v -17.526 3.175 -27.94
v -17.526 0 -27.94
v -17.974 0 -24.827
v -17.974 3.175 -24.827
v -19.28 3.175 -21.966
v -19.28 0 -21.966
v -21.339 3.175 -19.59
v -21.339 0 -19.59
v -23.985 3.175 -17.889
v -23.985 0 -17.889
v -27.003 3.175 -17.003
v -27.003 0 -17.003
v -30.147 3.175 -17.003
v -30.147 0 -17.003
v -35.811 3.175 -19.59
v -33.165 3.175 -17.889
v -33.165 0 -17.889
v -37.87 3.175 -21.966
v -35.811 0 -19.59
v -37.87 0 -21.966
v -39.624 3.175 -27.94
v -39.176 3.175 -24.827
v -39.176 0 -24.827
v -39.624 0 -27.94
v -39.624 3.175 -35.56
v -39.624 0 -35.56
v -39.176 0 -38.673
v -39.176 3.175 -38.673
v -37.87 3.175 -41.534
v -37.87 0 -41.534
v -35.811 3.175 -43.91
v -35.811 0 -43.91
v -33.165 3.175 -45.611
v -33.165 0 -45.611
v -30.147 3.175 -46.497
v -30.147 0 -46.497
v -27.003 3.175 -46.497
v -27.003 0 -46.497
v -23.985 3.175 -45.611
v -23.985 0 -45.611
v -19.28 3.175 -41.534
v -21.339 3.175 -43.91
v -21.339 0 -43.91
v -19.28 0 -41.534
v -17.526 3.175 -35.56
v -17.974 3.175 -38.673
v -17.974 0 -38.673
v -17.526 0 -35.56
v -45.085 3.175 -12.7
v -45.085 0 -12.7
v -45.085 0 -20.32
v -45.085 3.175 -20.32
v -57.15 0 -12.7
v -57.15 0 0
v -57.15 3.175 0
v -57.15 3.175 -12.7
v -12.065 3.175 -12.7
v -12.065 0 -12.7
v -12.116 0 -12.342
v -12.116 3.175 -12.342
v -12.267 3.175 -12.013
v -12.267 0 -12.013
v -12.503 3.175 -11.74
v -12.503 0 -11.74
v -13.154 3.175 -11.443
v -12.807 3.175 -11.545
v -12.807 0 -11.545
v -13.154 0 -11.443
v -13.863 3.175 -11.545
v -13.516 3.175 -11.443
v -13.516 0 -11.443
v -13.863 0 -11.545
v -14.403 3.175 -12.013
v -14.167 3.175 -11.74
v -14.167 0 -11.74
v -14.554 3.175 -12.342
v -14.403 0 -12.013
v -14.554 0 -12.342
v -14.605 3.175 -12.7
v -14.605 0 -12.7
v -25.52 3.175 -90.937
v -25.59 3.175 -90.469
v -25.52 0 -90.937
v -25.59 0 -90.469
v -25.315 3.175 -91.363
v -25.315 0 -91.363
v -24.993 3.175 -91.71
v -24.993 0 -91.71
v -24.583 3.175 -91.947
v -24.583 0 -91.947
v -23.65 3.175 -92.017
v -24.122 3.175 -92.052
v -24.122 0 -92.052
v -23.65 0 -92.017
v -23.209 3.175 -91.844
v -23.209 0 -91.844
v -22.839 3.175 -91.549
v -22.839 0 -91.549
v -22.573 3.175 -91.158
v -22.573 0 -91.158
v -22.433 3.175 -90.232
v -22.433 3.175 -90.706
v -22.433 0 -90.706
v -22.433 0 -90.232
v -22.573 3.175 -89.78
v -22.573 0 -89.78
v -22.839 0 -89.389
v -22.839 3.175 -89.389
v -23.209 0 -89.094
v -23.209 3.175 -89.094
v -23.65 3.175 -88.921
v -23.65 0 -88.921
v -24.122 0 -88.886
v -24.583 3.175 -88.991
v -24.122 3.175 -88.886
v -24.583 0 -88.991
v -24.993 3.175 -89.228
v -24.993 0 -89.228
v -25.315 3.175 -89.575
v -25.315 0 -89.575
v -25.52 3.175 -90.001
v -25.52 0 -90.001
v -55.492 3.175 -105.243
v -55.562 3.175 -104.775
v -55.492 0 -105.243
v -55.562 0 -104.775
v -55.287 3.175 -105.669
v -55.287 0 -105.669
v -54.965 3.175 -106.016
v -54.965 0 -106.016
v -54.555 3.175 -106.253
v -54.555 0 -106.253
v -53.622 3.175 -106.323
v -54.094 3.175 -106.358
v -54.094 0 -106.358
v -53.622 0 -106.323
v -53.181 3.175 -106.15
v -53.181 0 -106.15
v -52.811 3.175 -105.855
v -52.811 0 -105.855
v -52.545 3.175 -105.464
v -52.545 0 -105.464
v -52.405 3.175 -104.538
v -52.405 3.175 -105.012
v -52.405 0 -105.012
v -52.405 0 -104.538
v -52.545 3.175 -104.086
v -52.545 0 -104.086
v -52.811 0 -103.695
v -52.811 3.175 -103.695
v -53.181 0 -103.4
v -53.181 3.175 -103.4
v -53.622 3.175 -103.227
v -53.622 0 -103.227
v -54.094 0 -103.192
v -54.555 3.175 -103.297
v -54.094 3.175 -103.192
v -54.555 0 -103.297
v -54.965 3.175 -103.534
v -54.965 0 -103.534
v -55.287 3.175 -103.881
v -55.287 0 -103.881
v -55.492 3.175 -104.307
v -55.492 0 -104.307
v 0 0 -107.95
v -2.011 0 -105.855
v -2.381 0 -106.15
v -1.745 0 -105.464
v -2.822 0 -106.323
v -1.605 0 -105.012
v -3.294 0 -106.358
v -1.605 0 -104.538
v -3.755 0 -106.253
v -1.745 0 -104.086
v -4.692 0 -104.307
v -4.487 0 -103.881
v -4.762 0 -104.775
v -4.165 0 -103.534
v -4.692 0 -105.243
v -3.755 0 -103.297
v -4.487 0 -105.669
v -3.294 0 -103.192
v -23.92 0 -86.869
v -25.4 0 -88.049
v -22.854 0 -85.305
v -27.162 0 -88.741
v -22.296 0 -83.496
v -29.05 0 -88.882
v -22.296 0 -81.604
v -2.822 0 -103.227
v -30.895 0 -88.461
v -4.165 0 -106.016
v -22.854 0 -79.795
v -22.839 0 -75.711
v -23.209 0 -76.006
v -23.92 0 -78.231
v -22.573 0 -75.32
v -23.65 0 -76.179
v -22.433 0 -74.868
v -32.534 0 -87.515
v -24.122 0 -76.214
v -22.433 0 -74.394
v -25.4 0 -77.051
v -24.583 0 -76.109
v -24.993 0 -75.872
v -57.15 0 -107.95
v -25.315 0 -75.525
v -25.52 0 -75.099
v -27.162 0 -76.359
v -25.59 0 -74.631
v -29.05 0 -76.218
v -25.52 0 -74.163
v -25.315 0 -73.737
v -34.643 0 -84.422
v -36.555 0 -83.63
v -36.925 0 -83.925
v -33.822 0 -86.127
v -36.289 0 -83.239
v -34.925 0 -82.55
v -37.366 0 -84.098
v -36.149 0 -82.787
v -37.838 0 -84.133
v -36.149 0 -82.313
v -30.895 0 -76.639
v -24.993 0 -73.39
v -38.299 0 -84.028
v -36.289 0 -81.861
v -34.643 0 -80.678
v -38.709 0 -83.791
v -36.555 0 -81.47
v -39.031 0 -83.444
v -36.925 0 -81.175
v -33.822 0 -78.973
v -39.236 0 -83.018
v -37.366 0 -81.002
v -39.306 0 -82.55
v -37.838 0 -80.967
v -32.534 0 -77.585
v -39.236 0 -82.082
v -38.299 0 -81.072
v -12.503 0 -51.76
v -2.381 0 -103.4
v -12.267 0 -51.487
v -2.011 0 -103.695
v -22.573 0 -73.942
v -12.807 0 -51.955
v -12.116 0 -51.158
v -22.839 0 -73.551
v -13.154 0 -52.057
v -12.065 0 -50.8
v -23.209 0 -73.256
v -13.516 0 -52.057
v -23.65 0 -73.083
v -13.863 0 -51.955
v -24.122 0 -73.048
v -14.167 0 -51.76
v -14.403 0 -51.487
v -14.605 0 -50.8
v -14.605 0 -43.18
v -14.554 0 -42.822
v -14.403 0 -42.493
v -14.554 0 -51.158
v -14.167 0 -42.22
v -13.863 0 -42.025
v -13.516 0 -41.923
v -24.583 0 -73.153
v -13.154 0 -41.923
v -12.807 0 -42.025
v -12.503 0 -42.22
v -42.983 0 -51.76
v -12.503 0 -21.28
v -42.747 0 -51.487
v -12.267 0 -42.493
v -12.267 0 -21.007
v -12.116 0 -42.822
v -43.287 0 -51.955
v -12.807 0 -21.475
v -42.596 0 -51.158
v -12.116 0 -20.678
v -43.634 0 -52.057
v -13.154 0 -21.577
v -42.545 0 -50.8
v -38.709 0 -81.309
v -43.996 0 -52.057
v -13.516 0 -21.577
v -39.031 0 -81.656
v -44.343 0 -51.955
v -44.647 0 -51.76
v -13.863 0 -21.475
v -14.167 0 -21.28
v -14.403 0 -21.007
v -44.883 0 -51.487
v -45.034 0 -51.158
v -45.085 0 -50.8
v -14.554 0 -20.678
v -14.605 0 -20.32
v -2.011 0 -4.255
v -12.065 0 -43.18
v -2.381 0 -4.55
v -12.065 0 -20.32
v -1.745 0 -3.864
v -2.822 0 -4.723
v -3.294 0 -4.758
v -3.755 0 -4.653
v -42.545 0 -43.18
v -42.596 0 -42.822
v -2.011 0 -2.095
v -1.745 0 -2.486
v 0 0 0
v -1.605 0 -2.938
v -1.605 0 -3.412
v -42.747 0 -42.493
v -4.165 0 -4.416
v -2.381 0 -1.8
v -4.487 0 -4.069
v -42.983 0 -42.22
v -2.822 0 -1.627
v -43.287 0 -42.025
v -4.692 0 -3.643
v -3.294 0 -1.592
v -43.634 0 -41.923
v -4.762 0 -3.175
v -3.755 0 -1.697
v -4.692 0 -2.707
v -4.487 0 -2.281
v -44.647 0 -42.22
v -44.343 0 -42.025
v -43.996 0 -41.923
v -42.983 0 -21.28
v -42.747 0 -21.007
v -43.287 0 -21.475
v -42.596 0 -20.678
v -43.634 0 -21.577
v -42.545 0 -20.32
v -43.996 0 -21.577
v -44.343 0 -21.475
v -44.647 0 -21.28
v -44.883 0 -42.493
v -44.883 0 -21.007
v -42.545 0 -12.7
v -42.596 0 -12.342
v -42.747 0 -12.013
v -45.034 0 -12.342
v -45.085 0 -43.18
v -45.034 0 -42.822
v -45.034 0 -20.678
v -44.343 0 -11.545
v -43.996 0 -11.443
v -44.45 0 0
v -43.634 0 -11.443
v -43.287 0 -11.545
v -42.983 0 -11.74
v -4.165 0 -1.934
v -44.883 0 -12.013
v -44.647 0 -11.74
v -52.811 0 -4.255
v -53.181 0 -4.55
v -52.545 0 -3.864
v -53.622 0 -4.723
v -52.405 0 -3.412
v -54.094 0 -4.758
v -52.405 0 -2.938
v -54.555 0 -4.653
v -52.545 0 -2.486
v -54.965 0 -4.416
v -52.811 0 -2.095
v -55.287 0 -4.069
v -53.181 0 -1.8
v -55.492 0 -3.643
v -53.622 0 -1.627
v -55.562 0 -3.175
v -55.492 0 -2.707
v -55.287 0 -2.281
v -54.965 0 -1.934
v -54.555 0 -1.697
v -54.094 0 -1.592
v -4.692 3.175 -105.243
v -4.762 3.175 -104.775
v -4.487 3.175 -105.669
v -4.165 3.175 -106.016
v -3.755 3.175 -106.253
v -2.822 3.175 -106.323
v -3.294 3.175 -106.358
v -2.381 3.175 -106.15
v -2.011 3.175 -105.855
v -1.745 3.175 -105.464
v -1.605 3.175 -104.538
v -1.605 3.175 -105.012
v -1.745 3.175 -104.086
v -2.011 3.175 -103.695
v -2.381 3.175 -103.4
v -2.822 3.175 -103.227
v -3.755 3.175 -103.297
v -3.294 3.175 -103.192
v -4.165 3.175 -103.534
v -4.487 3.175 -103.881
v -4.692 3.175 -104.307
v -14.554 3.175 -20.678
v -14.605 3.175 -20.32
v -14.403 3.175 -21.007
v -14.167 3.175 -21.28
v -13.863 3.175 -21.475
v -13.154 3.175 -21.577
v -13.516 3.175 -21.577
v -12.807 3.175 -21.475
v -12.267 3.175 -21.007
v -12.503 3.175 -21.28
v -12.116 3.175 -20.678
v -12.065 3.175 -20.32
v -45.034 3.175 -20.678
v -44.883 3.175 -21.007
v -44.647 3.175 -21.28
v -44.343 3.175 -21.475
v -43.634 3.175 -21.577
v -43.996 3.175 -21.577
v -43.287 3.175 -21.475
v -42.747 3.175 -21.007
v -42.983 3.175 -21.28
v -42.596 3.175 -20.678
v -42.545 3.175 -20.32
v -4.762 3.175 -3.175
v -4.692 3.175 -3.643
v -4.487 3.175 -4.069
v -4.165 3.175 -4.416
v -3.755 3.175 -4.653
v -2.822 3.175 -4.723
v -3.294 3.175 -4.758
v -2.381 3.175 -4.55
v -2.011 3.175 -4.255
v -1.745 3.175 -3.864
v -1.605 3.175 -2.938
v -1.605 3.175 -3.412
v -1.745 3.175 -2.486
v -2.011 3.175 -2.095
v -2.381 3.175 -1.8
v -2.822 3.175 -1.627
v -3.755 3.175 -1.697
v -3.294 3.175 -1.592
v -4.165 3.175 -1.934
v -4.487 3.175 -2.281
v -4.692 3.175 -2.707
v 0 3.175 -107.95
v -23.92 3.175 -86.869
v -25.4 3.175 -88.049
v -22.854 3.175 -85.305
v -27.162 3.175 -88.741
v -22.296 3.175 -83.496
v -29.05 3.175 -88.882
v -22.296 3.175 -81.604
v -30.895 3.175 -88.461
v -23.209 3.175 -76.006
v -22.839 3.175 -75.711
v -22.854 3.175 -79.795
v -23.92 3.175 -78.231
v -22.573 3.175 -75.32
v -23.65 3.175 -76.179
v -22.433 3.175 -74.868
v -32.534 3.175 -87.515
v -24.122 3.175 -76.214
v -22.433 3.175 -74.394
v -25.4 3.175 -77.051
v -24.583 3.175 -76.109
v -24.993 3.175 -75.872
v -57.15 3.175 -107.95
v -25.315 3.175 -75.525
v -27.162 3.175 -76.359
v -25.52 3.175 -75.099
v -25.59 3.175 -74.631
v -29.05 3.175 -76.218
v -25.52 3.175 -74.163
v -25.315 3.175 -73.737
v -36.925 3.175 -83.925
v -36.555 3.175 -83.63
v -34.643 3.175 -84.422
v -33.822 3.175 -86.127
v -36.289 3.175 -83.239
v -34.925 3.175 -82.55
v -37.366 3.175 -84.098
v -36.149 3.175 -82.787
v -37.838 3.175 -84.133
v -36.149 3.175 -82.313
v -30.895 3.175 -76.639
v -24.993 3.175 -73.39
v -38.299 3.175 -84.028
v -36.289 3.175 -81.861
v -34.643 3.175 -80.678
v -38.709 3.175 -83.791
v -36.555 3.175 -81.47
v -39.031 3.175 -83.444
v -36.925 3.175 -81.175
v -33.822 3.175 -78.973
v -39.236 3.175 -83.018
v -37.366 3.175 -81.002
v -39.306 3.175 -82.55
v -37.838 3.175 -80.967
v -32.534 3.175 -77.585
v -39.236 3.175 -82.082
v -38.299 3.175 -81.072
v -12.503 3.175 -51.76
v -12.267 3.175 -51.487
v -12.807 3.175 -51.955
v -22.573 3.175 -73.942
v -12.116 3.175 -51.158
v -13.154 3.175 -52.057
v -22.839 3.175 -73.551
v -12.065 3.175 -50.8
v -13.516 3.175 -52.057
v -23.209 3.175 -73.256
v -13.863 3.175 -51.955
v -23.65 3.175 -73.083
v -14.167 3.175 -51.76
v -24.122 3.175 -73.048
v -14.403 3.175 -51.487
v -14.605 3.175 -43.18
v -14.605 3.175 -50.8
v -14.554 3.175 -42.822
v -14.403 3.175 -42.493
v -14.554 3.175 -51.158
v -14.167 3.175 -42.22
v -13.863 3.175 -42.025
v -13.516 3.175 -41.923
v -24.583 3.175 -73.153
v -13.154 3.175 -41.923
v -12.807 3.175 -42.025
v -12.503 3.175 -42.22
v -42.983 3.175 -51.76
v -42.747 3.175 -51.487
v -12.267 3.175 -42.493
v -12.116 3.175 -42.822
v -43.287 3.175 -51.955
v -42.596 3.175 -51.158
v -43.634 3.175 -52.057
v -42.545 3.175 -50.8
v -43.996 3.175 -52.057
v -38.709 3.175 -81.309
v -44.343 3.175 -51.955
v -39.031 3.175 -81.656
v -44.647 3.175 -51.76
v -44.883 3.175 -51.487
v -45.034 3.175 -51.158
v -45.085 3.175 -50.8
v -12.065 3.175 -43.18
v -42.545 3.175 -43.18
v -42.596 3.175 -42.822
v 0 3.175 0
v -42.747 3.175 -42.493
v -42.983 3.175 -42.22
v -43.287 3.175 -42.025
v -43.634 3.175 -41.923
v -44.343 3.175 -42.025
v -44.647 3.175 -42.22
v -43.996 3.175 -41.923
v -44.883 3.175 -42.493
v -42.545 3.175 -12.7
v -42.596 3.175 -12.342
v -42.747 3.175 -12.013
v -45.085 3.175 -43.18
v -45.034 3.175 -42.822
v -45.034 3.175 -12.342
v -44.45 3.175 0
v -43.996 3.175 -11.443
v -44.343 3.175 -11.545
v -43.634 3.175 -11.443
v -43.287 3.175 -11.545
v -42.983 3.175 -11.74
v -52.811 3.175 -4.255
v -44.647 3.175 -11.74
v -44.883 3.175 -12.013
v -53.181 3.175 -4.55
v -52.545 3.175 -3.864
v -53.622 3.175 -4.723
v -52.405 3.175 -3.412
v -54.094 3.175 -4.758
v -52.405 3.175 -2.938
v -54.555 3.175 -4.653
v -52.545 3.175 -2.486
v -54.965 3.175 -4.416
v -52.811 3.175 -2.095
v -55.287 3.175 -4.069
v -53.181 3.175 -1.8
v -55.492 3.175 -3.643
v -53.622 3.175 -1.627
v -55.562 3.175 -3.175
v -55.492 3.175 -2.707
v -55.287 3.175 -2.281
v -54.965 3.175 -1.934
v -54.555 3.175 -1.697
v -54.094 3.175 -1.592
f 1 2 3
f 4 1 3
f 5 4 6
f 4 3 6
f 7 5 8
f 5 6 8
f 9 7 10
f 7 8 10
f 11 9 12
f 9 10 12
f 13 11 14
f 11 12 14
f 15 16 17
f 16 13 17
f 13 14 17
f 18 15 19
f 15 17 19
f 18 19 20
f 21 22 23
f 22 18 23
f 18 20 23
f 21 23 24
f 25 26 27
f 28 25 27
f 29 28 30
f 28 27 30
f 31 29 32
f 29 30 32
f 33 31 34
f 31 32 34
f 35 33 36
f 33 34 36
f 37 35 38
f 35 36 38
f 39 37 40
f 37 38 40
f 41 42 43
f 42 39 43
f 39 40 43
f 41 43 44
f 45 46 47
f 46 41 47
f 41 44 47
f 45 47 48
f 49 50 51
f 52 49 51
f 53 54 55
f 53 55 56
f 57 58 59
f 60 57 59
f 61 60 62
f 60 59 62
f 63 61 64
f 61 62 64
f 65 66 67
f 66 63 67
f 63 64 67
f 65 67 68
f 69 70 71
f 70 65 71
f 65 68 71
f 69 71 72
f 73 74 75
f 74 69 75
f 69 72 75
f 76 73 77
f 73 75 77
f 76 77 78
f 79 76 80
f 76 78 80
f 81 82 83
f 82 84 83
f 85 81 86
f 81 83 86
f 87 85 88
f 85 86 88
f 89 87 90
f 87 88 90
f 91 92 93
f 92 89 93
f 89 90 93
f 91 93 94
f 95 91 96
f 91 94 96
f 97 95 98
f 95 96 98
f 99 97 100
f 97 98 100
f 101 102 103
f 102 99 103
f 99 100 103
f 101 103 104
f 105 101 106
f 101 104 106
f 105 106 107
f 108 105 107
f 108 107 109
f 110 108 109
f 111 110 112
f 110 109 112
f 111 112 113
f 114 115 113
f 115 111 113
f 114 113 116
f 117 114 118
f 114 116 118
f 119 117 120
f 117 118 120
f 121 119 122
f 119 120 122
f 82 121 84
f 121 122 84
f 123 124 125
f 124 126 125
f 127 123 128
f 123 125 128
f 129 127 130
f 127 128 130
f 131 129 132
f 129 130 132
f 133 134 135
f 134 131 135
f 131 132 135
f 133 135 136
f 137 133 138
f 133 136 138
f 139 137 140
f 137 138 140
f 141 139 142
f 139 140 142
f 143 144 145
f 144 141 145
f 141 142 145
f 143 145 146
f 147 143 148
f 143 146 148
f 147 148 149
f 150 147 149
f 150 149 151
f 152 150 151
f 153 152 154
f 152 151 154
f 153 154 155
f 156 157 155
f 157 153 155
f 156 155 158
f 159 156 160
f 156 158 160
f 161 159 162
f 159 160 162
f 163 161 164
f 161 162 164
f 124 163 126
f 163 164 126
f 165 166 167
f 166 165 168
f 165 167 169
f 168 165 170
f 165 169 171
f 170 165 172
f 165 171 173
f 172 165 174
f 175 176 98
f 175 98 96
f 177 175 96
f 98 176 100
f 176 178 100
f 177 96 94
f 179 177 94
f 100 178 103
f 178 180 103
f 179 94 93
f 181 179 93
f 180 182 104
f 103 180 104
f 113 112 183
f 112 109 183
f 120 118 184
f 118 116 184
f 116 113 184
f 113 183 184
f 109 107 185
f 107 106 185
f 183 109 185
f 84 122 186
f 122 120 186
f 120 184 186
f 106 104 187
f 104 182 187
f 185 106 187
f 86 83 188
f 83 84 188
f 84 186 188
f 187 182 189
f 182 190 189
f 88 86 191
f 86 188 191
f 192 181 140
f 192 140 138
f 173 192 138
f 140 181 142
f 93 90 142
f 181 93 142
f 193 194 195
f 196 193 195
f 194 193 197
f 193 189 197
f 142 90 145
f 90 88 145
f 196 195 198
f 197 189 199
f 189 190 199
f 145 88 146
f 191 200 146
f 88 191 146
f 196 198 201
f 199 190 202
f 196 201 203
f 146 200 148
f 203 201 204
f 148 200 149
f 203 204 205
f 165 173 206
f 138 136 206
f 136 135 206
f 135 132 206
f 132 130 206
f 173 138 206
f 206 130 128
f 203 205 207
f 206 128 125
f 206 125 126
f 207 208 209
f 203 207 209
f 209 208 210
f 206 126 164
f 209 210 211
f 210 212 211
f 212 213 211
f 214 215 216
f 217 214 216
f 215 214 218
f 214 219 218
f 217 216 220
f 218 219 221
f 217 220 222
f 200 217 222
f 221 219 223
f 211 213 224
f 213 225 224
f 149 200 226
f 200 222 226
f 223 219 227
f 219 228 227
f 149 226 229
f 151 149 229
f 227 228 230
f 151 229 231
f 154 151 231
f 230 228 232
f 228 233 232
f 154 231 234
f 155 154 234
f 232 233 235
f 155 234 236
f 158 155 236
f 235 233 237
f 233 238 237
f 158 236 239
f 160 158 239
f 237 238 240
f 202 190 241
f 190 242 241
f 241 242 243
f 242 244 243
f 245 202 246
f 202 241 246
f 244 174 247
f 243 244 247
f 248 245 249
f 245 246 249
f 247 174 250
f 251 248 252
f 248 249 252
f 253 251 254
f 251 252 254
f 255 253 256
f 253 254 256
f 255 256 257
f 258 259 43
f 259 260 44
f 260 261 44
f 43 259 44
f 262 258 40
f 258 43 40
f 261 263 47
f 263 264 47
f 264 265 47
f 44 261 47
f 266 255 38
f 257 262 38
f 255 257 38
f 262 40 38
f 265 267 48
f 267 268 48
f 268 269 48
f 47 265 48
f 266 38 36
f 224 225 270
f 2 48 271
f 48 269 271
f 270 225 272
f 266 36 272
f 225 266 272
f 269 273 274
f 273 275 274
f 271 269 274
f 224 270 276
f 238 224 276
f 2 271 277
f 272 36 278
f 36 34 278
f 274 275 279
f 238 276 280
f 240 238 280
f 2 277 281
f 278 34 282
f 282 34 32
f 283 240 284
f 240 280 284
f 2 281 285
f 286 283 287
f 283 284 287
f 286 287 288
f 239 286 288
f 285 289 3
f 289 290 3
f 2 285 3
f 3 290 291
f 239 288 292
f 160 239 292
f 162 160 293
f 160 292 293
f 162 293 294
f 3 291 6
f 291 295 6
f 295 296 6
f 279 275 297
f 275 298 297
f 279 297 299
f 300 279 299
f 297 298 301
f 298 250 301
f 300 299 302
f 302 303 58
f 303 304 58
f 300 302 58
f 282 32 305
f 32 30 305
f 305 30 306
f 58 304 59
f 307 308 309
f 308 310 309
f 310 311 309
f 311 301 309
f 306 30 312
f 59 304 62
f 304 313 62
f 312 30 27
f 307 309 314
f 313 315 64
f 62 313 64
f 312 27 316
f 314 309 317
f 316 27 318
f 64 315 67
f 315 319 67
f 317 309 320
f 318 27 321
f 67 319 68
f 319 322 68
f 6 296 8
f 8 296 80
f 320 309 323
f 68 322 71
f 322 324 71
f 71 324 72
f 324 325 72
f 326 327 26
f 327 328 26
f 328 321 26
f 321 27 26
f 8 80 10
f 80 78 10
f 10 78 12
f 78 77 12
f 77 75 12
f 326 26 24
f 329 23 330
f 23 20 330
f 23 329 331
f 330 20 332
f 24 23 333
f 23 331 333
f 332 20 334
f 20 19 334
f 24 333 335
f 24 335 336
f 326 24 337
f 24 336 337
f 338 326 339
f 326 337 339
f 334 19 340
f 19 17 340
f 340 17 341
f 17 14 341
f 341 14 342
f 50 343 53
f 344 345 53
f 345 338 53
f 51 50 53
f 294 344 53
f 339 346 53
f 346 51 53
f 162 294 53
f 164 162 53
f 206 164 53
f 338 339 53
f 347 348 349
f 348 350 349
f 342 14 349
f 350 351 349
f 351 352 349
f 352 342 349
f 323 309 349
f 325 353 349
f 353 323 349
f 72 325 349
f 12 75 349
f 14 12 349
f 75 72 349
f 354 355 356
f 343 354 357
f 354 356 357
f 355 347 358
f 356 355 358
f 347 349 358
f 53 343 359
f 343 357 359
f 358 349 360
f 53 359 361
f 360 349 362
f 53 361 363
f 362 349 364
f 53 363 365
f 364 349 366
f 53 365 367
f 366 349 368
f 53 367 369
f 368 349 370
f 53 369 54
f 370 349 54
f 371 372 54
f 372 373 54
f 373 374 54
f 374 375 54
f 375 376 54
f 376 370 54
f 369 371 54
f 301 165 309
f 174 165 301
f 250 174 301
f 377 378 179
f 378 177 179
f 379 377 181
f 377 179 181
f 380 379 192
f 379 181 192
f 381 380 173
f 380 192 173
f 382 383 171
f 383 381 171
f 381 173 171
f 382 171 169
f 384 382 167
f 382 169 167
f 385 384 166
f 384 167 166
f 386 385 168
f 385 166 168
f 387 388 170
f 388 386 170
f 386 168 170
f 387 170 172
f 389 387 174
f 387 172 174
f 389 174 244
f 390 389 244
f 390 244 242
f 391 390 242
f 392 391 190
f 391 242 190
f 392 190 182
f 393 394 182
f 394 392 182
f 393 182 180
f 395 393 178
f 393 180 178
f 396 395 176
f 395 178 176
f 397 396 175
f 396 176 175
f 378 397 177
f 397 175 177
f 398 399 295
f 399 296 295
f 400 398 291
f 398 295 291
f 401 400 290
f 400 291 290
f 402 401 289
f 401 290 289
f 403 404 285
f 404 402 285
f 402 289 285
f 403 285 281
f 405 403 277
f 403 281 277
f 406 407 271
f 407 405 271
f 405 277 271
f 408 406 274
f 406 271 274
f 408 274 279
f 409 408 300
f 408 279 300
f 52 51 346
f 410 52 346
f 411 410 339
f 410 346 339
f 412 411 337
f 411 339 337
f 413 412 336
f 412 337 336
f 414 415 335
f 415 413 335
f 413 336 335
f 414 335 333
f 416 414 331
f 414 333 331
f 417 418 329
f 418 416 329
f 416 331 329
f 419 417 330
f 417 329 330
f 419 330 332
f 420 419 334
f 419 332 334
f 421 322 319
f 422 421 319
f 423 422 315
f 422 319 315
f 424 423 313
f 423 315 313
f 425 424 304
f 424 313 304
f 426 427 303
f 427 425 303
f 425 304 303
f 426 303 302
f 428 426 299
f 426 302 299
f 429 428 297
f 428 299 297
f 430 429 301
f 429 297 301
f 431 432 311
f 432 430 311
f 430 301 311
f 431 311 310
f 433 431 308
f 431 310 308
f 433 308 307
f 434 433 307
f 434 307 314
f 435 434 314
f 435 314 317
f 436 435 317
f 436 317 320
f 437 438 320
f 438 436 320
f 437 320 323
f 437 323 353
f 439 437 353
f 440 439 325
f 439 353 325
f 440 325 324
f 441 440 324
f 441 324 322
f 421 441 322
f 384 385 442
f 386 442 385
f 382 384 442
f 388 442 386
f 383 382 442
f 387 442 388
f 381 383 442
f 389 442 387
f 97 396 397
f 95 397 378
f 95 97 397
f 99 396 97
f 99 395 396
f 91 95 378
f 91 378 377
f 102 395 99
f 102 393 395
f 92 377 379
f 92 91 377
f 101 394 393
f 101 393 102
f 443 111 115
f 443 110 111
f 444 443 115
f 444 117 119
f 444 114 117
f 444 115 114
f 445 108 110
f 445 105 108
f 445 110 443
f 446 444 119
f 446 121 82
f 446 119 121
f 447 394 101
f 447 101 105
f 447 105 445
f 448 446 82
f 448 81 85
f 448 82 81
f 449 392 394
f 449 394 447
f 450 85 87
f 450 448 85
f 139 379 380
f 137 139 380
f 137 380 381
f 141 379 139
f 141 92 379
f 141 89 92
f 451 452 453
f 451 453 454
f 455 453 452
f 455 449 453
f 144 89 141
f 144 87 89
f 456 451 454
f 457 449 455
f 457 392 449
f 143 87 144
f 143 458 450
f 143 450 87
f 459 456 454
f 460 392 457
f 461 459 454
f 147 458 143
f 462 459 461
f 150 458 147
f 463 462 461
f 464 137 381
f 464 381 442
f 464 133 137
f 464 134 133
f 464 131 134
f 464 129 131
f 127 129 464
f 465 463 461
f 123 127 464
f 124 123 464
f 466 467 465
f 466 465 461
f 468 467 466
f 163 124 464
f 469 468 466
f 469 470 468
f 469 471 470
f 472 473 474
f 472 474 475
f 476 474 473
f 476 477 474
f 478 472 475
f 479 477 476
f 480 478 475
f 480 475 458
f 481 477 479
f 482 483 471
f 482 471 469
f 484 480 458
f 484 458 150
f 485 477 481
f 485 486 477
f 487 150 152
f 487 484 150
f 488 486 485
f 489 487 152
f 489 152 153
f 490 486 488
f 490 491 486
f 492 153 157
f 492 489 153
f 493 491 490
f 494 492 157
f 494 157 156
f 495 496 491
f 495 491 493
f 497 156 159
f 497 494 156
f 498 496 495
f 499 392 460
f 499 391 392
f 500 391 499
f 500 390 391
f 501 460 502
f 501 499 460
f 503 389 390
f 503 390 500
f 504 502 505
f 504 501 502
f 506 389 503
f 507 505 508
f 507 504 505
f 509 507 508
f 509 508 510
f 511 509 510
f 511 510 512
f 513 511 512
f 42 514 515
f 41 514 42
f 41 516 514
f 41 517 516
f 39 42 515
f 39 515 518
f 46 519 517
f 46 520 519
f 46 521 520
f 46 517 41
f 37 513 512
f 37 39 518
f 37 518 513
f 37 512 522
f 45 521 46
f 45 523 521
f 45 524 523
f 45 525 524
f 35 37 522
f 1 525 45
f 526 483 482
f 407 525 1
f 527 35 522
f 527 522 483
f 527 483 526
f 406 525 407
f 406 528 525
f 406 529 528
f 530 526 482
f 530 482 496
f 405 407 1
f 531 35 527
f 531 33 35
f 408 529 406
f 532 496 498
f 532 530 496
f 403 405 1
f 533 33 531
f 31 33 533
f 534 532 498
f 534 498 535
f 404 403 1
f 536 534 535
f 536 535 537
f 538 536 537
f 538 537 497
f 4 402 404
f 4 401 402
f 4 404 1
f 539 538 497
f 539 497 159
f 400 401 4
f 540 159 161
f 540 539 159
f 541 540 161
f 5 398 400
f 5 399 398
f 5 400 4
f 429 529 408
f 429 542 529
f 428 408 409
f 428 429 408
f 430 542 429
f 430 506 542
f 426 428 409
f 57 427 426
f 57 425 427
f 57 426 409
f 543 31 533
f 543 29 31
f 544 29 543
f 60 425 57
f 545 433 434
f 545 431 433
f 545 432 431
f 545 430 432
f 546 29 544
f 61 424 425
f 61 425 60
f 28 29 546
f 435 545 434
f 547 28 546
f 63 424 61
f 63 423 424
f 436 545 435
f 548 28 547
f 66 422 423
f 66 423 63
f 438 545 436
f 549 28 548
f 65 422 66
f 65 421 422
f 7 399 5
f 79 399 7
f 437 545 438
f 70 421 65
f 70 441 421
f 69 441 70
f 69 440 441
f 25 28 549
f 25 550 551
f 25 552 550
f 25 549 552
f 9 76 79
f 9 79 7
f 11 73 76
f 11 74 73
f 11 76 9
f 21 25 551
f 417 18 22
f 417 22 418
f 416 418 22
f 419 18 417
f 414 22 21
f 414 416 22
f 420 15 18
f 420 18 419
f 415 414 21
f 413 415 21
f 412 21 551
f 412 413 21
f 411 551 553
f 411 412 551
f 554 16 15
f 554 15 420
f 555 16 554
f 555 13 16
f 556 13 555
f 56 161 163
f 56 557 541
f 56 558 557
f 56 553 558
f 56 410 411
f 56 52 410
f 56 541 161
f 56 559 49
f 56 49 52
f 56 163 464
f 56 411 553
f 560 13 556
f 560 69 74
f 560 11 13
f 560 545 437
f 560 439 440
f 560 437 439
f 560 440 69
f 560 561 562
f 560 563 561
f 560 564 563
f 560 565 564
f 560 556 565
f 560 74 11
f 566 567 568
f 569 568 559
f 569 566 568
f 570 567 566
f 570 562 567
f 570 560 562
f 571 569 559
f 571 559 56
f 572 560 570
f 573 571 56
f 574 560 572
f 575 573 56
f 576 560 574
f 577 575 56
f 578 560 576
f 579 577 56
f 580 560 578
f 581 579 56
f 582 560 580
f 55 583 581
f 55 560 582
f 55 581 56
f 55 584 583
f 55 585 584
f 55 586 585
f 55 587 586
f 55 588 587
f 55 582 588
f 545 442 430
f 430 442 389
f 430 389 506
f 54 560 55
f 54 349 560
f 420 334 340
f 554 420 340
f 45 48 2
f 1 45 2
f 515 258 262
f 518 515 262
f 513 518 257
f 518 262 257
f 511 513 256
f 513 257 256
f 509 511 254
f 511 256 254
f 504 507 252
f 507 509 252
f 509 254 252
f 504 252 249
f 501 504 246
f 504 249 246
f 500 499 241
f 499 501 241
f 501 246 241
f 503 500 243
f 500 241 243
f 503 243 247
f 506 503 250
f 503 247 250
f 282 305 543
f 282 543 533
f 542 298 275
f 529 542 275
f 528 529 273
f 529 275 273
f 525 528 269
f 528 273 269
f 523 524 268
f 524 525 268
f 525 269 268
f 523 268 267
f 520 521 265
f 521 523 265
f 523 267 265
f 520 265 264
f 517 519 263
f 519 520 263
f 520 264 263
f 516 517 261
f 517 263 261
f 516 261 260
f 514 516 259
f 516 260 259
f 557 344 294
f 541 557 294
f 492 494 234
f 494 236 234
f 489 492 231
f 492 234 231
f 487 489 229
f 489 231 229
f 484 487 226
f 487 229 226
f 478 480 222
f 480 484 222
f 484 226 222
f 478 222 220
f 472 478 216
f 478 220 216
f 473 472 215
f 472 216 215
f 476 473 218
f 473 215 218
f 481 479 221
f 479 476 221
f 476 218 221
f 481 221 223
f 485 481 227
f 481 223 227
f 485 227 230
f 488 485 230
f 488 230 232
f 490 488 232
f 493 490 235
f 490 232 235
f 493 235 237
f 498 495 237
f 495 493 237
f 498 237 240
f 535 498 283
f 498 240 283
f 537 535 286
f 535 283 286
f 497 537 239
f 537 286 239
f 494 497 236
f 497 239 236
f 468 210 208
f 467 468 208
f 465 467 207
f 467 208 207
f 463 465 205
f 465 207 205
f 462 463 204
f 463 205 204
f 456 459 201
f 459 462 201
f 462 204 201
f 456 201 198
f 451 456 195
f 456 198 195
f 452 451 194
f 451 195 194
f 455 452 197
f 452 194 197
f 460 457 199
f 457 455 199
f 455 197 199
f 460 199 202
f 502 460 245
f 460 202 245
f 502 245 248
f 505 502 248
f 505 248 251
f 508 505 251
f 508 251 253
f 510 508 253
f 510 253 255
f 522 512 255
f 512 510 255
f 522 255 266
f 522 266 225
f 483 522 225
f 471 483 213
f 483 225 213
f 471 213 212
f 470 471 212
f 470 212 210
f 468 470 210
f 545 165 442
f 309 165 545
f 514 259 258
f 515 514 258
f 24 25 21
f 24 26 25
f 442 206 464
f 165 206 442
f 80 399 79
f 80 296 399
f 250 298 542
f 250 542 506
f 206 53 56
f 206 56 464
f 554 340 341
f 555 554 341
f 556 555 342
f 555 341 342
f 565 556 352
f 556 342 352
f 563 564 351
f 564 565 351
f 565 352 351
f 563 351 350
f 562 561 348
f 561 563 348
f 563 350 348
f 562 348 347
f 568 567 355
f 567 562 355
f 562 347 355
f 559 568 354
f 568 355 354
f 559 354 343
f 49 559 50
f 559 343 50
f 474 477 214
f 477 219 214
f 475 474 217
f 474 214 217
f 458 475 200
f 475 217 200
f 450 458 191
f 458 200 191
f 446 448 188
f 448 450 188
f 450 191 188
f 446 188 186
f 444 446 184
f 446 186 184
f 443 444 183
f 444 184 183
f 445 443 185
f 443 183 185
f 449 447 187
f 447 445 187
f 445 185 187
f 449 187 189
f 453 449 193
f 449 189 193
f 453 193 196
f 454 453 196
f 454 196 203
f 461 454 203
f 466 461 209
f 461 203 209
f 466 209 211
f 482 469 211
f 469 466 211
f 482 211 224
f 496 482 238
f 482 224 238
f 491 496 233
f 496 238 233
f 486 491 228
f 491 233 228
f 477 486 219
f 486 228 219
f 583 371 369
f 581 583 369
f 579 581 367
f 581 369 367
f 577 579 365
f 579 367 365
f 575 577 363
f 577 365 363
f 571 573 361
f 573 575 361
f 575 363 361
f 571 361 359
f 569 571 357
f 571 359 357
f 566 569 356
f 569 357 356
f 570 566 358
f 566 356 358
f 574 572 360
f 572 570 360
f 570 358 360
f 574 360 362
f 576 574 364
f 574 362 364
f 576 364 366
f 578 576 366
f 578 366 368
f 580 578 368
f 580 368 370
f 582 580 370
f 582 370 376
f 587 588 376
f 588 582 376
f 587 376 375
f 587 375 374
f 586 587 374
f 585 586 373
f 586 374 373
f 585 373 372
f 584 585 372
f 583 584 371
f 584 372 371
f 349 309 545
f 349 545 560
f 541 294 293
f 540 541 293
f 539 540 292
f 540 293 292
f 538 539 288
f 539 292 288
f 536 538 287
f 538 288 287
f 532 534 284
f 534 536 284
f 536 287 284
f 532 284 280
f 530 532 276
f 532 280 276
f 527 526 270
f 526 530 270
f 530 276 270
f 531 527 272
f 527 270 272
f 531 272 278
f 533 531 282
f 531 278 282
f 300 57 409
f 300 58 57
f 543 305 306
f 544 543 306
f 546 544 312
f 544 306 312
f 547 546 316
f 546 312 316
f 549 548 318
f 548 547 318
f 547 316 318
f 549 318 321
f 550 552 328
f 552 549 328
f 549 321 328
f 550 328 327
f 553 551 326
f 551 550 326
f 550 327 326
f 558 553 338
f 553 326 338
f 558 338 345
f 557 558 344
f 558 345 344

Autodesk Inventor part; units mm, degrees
ref_plane "YZ Plane" through (0, 0, 0) normal (1, 0, 0) x (0, 1, 0)
ref_plane "XZ Plane" through (0, 0, 0) normal (0, 1, 0) x (-1, 0, 0)
ref_plane "XY Plane" through (0, 0, 0) normal (0, 0, 1) x (1, 0, 0)
sketch "Sketch1" plane through (0, 0, 0) normal (0, 1, 0) x (-1, 0, 0)
  line L0 (0, 0) -> (57.15, 0)
  line L1 (57.15, 0) -> (57.15, -107.95)
  line L2 (57.15, -107.95) -> (0, -107.95)
  line L3 (0, -107.95) -> (0, 0)
  line L4 (57.15, -53.975) -> (0, -53.975) construction
  circle A0 centre (28.575, -35.56) radius 11.049
  line L5 (28.575, -35.56) -> (43.815, -35.56) construction
  line L6 (43.815, -35.56) -> (43.815, -50.8) construction
  line L7 (43.815, -50.8) -> (28.575, -50.8) construction
  line L8 (28.575, -50.8) -> (28.575, -35.56) construction
  line L9 (28.575, -35.56) -> (13.335, -35.56) construction
  line L10 (13.335, -35.56) -> (13.335, -20.32) construction
  line L11 (13.335, -20.32) -> (28.575, -20.32) construction
  line L12 (28.575, -20.32) -> (28.575, -35.56) construction
  line L13 (43.815, -50.8) -> (13.335, -50.8) construction
  line L14 (13.335, -50.8) -> (13.335, -20.32) construction
  line L15 (13.335, -20.32) -> (43.815, -20.32) construction
  line L16 (43.815, -20.32) -> (43.815, -50.8) construction
  circle A1 centre (43.815, -50.8) radius 1.27
  circle A2 centre (43.815, -20.32) radius 1.27
  circle A3 centre (13.335, -50.8) radius 1.27
  circle A4 centre (13.335, -20.32) radius 1.27
  line L17 (28.575, -107.95) -> (28.575, -53.975) construction
  line L18 (28.575, -35.56) -> (28.575, -27.94) construction
  circle A5 centre (28.575, -27.94) radius 11.049
  line L19 (43.815, -50.8) -> (43.815, -43.18) construction
  line L20 (13.335, -50.8) -> (13.335, -43.18) construction
  line L21 (13.335, -20.32) -> (13.335, -12.7) construction
  line L22 (43.815, -20.32) -> (43.815, -12.7) construction
  circle A6 centre (43.815, -43.18) radius 1.27
  circle A7 centre (13.335, -43.18) radius 1.27
  circle A8 centre (13.335, -12.7) radius 1.27
  circle A9 centre (43.815, -12.7) radius 1.27
  line L23 (45.085, -43.18) -> (45.085, -50.8)
  line L24 (42.545, -43.18) -> (42.545, -50.8)
  line L25 (14.605, -43.18) -> (14.605, -50.8)
  line L26 (12.065, -43.18) -> (12.065, -50.8)
  line L27 (12.065, -12.7) -> (12.065, -20.32)
  line L28 (14.605, -20.32) -> (14.605, -12.7)
  line L29 (45.085, -12.7) -> (45.085, -20.32)
  line L30 (42.545, -20.32) -> (42.545, -12.7)
  line L31 (28.575, -107.95) -> (28.575, -82.55) construction
  circle A10 centre (28.575, -82.55) radius 6.35
  line L32 (57.15, 0) -> (57.15, -12.7)
  line L33 (57.15, 0) -> (44.45, 0)
  line L34 (44.45, 0) -> (57.15, -12.7) construction
  line L35 (57.15, 0) -> (50.8, -6.35) construction
  line L36 (0, 0) -> (12.7, 0) construction
  line L37 (0, 0) -> (0, -12.7) construction
  line L38 (0, -12.7) -> (12.7, 0) construction
  line L39 (0, 0) -> (6.35, -6.35) construction
  line L40 (57.15, -107.95) -> (57.15, -95.25) construction
  line L41 (57.15, -107.95) -> (44.45, -107.95) construction
  line L42 (44.45, -107.95) -> (57.15, -95.25) construction
  line L43 (57.15, -107.95) -> (50.8, -101.6) construction
  line L44 (0, -107.95) -> (12.7, -107.95) construction
  line L45 (0, -107.95) -> (0, -95.25) construction
  line L46 (0, -95.25) -> (12.7, -107.95) construction
  line L47 (6.35, -101.6) -> (0, -107.95) construction
  circle A11 centre (53.975, -104.775) radius 1.5875
  circle A12 centre (3.175, -104.775) radius 1.5875
  circle A13 centre (53.975, -3.175) radius 1.5875
  circle A14 centre (3.175, -3.175) radius 1.5875
  line L48 (17.526, -35.56) -> (17.526, -27.94)
  line L49 (39.624, -35.56) -> (39.624, -27.94)
  line L50 (28.575, -82.55) -> (37.719, -82.55) construction
  line L51 (28.575, -82.55) -> (24.003, -74.6311) construction
  line L52 (28.575, -82.55) -> (24.003, -90.4689) construction
  circle A15 centre (24.003, -90.4689) radius 1.5875
  circle A16 centre (37.719, -82.55) radius 1.5875
  circle A17 centre (24.003, -74.6311) radius 1.5875
  point P0 (38.7216, -23.5665)
  point P1 (18.4284, -23.5665)
  dimension "d0" = 57.15
  dimension "d1" = 107.95
  dimension "d2" = 22.098
  dimension "d3" = 15.24
  dimension "d4" = 15.24
  dimension "d5" = 15.24
  dimension "d6" = 15.24
  dimension "d7" = 2.54
  dimension "d8" = 2.54
  dimension "d9" = 2.54
  dimension "d10" = 2.54
  dimension "d11" = 7.62
  dimension "d12" = 22.098
  dimension "d13" = 7.62
  dimension "d14" = 7.62
  dimension "d15" = 7.62
  dimension "d16" = 7.62
  dimension "d17" = 2.54
  dimension "d18" = 2.54
  dimension "d19" = 2.54
  dimension "d20" = 2.54
  dimension "d21" = 25.4
  dimension "d22" = 12.7
  dimension "d25" = 12.7
  dimension "d26" = 12.7
  dimension "d27" = 12.7
  dimension "d28" = 12.7
  dimension "d29" = 12.7
  dimension "d30" = 12.7
  dimension "d31" = 12.7
  dimension "d32" = 12.7
  dimension "d33" = 3.175
  dimension "d34" = 3.175
  dimension "d35" = 3.175
  dimension "d36" = 3.175
  dimension "d39" = 35.56
  dimension "d42" = 9.144
  dimension "d43" = 9.144
  dimension "d45" = 120
  dimension "d47" = 9.144
  dimension "d48" = 120
  dimension "d49" = 3.175
  dimension "d50" = 3.175
  dimension "d51" = 3.175
extrude "Extrusion4" add sketch "Sketch1" along normal blind 3.175
equation "\"d3\" = d5"
equation "\"d4\" = d6"
equation "\"d7\" = d10"
equation "\"d8\" = d10"
equation "\"d9\" = d10"
equation "\"d12\" = d2"
equation "\"d13\" = d11"
equation "\"d14\" = d11"
equation "\"d15\" = d11"
equation "\"d16\" = d11"
equation "\"d17\" = d10"
equation "\"d18\" = d10"
equation "\"d19\" = d10"
equation "\"d20\" = d10"
equation "\"d42\" = d47"
equation "\"d43\" = d47"
equation "\"d50\" = d49"
equation "\"d51\" = d49"
properties part number "lid"
